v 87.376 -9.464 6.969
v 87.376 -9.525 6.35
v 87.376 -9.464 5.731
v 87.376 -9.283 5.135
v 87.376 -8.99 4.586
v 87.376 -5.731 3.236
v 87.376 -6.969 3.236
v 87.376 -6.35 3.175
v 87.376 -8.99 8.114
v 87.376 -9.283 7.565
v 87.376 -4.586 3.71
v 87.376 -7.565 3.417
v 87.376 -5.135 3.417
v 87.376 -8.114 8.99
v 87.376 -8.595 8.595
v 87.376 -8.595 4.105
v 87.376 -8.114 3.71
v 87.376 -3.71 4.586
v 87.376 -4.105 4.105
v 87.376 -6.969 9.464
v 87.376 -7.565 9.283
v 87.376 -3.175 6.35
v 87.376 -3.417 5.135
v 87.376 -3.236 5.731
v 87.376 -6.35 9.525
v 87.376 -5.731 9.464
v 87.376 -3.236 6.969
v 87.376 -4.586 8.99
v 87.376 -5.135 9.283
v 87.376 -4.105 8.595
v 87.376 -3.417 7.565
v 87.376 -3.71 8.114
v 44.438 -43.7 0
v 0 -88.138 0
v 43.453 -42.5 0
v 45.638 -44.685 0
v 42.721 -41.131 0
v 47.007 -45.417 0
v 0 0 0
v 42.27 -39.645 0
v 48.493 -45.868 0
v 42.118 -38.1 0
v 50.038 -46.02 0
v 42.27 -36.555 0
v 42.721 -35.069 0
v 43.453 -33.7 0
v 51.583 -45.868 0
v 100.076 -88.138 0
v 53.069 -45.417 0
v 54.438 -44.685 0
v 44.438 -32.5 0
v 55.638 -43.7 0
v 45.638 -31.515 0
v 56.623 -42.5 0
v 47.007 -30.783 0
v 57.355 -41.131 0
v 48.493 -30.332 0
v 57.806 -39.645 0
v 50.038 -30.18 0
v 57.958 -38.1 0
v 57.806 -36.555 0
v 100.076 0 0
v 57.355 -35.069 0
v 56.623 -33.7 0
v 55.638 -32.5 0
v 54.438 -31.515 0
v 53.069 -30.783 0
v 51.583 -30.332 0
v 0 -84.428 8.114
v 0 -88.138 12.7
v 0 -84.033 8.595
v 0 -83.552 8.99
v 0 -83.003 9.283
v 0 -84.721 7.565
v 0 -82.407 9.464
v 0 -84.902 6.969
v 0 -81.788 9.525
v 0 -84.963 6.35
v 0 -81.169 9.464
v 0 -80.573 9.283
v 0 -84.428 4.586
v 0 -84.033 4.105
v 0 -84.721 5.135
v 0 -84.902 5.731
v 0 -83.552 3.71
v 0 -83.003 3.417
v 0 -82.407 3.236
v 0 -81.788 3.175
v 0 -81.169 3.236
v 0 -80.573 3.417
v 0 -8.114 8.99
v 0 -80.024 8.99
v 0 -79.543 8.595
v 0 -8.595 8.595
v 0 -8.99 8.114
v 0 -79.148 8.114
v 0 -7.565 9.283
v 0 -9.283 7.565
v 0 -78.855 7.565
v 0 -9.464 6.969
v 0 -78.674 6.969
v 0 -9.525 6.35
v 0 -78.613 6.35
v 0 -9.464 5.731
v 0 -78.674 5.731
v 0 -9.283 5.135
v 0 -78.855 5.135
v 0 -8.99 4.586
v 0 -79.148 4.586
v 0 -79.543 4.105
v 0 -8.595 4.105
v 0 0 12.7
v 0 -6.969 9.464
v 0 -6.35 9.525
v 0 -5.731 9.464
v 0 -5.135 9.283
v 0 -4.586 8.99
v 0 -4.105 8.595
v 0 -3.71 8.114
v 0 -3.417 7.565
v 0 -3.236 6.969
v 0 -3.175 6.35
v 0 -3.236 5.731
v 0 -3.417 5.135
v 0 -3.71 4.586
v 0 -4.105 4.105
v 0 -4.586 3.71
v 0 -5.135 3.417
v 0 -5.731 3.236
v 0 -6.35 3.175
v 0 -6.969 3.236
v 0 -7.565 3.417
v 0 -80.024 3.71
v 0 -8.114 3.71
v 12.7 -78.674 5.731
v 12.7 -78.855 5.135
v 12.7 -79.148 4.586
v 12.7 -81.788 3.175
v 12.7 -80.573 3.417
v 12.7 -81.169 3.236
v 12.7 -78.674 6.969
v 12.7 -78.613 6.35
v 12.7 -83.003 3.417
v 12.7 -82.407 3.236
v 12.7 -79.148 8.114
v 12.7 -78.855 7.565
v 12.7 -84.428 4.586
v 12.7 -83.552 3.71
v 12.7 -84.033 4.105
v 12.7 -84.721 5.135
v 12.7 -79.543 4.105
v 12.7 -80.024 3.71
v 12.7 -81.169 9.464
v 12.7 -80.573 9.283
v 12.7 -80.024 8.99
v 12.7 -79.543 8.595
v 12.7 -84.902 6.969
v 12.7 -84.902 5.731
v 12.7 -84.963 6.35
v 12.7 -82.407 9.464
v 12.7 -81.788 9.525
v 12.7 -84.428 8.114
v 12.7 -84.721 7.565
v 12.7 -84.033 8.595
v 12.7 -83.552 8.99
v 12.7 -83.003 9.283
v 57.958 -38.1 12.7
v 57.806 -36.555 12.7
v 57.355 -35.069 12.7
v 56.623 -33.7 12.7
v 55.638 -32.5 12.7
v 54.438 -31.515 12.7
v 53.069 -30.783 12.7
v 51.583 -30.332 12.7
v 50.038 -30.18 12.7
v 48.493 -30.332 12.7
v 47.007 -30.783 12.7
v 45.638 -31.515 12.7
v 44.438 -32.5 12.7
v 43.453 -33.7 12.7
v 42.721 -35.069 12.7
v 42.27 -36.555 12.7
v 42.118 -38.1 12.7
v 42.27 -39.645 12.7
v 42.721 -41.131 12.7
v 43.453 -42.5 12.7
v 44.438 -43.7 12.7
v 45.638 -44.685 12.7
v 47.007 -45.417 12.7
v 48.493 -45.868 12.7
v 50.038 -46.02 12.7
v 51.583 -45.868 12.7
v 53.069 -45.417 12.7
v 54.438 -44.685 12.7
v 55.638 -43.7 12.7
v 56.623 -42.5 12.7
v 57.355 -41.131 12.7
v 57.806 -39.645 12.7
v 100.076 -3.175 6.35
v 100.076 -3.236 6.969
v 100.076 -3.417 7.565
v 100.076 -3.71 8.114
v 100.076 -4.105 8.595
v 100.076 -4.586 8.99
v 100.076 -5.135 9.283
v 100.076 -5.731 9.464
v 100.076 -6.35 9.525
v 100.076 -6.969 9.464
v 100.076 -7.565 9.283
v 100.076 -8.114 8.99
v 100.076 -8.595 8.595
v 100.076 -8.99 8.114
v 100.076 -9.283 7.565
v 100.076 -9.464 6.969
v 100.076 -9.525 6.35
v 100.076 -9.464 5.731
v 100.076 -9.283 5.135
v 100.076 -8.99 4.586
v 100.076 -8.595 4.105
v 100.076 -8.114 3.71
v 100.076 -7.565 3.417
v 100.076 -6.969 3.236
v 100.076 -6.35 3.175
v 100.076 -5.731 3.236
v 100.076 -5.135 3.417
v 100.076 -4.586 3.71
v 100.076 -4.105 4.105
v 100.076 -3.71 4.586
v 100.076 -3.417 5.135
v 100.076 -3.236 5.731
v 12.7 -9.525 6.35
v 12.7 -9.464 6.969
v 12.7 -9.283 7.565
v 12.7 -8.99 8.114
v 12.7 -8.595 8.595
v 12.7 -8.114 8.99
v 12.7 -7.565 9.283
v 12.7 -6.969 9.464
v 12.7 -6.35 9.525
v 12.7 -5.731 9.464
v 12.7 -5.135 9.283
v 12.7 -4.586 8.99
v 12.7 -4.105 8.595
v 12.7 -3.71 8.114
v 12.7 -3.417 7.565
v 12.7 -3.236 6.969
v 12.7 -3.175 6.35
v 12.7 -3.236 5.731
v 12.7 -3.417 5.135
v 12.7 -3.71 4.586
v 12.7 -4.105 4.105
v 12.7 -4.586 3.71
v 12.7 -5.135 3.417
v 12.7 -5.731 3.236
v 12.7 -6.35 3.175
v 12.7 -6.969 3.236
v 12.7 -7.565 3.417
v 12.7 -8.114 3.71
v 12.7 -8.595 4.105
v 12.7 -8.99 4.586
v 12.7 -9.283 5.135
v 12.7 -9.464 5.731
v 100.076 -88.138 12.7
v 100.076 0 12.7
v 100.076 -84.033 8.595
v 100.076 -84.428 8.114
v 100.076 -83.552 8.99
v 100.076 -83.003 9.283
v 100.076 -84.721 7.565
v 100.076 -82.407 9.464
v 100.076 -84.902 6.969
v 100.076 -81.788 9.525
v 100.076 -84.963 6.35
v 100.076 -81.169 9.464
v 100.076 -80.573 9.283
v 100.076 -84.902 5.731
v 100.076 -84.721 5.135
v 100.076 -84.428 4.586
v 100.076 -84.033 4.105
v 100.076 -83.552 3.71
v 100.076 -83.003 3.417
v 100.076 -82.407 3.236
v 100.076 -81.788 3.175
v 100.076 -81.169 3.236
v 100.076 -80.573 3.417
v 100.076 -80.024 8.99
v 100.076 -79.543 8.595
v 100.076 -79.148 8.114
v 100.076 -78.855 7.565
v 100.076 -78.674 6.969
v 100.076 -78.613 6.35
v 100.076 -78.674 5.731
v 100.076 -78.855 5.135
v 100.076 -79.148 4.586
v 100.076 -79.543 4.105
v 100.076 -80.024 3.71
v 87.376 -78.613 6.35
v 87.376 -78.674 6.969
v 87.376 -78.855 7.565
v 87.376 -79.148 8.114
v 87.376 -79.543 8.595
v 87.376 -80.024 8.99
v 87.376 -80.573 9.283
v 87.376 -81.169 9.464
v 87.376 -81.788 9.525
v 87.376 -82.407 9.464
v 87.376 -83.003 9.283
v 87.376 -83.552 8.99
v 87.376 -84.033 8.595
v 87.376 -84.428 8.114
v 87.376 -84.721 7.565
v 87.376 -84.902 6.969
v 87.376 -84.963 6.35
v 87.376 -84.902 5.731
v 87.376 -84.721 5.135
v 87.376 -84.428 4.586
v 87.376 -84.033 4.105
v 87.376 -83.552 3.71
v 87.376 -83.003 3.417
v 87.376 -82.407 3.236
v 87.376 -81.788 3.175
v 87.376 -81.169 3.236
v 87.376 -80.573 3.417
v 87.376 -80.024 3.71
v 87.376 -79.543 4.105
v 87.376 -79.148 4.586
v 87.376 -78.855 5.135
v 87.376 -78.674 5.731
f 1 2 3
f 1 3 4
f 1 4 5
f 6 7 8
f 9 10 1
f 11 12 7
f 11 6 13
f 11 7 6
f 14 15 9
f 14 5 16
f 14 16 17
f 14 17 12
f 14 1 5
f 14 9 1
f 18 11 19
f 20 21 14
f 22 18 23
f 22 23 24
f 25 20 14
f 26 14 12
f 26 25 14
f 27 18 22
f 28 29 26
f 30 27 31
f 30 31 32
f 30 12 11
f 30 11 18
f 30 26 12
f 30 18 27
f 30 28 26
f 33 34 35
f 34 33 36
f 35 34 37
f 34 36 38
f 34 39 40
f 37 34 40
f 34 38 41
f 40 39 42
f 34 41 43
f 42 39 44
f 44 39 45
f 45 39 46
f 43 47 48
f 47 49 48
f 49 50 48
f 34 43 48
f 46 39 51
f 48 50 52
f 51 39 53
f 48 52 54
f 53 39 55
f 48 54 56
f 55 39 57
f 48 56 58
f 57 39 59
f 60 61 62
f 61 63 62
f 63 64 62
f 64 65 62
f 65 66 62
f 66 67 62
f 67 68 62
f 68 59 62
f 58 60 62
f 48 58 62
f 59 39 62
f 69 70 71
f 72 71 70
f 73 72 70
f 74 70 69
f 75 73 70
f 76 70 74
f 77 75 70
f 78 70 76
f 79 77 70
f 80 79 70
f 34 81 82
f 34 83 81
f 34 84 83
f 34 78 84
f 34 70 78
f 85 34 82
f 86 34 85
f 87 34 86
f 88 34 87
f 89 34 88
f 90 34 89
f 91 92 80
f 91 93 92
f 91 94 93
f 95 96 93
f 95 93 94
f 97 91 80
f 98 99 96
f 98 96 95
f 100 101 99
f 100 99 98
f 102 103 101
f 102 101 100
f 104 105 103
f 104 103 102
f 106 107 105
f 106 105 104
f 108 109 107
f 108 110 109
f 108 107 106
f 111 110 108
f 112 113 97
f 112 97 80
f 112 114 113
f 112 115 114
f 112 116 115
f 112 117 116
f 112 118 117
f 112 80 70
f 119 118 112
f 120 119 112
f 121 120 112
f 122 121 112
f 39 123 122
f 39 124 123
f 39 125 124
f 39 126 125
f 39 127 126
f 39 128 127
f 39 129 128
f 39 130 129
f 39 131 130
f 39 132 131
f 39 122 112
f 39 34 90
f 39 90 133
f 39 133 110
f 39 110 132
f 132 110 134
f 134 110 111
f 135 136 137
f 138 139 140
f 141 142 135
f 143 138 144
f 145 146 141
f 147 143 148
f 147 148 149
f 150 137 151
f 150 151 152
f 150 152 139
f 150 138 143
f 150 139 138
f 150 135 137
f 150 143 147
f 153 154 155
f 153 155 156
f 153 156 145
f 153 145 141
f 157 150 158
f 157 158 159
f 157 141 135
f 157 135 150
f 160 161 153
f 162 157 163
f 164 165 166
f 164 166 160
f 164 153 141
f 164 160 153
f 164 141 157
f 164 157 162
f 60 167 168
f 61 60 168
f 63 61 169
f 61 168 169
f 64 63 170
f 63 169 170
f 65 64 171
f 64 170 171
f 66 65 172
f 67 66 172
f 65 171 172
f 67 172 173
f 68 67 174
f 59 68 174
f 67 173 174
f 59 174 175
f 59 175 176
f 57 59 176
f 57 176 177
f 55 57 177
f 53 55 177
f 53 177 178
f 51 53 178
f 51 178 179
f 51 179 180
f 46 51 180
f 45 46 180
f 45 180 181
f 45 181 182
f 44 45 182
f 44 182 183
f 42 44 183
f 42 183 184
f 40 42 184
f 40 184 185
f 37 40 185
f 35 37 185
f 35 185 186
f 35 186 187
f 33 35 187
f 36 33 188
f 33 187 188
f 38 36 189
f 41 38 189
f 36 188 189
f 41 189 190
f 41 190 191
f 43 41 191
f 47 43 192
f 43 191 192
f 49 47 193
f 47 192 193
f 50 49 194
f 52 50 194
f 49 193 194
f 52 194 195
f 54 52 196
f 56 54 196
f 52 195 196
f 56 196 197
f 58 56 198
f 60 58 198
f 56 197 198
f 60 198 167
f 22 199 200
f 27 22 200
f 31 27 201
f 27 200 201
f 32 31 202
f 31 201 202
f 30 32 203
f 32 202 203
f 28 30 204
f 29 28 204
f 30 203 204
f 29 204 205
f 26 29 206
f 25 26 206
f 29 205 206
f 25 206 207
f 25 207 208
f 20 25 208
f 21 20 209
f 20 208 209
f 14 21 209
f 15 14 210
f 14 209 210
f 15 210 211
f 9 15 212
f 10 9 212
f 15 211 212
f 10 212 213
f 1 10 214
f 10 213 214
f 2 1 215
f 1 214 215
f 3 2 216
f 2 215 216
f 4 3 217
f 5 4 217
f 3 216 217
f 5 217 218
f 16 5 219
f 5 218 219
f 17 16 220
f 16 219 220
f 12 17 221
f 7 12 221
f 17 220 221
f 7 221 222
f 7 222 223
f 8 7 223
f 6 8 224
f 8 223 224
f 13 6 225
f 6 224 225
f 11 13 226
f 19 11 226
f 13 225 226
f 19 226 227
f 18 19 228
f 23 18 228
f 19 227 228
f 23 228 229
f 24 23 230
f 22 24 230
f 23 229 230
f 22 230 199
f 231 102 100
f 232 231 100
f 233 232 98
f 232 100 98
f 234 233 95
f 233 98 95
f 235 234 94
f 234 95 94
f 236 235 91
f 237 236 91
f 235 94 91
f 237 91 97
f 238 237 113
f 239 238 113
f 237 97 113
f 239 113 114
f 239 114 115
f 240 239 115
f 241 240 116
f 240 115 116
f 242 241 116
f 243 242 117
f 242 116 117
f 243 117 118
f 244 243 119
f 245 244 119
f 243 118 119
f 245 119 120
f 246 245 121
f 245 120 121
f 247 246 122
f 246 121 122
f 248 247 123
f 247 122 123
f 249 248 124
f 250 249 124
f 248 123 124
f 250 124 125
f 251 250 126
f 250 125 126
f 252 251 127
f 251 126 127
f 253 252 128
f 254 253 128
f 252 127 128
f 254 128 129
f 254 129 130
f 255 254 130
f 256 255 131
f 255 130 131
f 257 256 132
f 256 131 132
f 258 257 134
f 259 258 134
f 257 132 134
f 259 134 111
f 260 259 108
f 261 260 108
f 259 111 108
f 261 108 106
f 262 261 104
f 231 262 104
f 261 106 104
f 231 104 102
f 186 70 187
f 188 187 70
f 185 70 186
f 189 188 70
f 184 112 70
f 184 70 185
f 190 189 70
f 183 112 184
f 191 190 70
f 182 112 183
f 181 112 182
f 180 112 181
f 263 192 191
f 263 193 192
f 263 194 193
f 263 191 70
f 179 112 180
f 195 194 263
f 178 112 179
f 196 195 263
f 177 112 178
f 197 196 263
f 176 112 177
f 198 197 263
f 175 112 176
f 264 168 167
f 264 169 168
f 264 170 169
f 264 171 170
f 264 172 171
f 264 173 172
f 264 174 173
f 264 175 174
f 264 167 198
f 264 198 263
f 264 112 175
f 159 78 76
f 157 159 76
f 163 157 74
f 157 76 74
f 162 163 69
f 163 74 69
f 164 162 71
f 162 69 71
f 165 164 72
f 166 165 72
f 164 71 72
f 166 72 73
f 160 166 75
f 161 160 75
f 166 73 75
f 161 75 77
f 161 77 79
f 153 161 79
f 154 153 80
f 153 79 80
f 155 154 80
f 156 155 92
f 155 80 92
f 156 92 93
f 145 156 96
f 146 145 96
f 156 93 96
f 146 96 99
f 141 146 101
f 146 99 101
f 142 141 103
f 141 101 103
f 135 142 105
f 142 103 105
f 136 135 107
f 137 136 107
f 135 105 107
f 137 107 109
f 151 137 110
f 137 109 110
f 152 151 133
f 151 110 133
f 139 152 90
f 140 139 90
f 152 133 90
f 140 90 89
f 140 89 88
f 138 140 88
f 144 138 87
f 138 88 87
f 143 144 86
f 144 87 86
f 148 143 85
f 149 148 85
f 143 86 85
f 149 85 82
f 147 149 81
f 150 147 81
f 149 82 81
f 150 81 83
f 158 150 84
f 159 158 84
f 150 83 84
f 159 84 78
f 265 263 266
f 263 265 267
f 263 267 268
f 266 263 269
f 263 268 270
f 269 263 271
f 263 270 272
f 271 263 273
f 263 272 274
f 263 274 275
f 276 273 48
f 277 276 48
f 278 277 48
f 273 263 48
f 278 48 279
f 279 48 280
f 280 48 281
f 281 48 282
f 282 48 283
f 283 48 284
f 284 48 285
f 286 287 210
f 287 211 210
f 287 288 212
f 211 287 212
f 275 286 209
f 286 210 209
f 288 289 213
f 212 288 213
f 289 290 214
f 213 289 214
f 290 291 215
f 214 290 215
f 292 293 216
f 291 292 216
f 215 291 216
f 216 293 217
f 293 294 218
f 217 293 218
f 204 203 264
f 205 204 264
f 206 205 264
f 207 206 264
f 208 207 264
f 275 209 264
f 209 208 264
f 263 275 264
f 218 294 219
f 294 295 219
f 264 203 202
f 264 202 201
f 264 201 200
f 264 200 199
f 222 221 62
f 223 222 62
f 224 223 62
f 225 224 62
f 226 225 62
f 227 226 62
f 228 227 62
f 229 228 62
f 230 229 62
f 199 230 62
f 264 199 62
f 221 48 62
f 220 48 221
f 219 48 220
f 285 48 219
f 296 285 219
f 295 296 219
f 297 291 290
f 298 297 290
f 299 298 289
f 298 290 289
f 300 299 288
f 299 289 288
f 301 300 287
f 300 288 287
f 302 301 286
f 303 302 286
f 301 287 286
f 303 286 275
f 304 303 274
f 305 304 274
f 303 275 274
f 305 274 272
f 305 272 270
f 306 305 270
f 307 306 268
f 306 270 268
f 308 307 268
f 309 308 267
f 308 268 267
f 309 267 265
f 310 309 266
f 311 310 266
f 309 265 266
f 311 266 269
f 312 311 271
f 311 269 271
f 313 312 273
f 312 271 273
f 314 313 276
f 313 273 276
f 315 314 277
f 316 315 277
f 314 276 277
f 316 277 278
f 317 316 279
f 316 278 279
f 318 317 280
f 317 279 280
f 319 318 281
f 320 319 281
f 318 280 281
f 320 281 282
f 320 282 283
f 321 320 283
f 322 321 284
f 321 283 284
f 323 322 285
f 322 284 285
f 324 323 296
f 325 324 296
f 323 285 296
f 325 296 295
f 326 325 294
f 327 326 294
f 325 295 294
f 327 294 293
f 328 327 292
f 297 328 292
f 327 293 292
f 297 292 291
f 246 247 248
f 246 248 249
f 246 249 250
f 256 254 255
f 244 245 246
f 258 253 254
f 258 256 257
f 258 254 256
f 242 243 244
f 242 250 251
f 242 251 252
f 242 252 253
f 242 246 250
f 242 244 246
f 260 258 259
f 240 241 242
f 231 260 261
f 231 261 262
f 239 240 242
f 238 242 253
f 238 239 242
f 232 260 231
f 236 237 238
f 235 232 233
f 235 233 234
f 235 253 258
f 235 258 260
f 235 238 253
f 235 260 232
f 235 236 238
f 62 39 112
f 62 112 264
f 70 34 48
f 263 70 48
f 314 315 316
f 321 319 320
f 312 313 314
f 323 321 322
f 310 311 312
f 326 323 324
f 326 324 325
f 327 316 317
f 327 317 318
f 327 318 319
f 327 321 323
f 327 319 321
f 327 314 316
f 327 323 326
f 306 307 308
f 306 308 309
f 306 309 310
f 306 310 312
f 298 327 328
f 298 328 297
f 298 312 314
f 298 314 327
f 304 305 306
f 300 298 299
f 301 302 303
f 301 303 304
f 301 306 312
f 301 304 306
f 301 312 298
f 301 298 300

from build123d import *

# Parameters (mm, degrees)
F0_W     = 100.076
F0_H     = 88.138
F1_DEPTH = 12.7
F2_R     = 7.91972
F3_DEPTH = 12.701
F4_R     = 3.175
F5_DEPTH = 12.7
F6_R     = 3.175
F7_DEPTH = 12.7


with BuildPart() as f1:
    # F0 (on Top) → F1 (new body)
    with BuildSketch(Plane.XY):
        with Locations((50.038, -44.069)):
            Rectangle(F0_W, F0_H)
    extrude(amount=F1_DEPTH)

    # F2 (on face) → F3 (cut, through all)
    with BuildSketch(Plane.XY.offset(12.7)):
        with Locations((50.038, -38.1)):
            Circle(F2_R)
    extrude(amount=-F3_DEPTH, mode=Mode.SUBTRACT)

    # F4 (on face) → F5 (cut)
    with BuildSketch(Plane.YZ.offset(100.076)):
        with Locations((-81.788, 6.35)):
            Circle(F4_R)
        with Locations((-6.35, 6.35)):
            Circle(F4_R)
    extrude(amount=-F5_DEPTH, mode=Mode.SUBTRACT)

    # F6 (on face) → F7 (cut)
    with BuildSketch(Plane(origin=(0, 0, 0), x_dir=(0, -1, 0), z_dir=(-1, 0, 0))):
        with Locations((6.35, 6.35)):
            Circle(F6_R)
        with Locations((81.788, 6.35)):
            Circle(F6_R)
    extrude(amount=-F7_DEPTH, mode=Mode.SUBTRACT)


solid = f1.part
